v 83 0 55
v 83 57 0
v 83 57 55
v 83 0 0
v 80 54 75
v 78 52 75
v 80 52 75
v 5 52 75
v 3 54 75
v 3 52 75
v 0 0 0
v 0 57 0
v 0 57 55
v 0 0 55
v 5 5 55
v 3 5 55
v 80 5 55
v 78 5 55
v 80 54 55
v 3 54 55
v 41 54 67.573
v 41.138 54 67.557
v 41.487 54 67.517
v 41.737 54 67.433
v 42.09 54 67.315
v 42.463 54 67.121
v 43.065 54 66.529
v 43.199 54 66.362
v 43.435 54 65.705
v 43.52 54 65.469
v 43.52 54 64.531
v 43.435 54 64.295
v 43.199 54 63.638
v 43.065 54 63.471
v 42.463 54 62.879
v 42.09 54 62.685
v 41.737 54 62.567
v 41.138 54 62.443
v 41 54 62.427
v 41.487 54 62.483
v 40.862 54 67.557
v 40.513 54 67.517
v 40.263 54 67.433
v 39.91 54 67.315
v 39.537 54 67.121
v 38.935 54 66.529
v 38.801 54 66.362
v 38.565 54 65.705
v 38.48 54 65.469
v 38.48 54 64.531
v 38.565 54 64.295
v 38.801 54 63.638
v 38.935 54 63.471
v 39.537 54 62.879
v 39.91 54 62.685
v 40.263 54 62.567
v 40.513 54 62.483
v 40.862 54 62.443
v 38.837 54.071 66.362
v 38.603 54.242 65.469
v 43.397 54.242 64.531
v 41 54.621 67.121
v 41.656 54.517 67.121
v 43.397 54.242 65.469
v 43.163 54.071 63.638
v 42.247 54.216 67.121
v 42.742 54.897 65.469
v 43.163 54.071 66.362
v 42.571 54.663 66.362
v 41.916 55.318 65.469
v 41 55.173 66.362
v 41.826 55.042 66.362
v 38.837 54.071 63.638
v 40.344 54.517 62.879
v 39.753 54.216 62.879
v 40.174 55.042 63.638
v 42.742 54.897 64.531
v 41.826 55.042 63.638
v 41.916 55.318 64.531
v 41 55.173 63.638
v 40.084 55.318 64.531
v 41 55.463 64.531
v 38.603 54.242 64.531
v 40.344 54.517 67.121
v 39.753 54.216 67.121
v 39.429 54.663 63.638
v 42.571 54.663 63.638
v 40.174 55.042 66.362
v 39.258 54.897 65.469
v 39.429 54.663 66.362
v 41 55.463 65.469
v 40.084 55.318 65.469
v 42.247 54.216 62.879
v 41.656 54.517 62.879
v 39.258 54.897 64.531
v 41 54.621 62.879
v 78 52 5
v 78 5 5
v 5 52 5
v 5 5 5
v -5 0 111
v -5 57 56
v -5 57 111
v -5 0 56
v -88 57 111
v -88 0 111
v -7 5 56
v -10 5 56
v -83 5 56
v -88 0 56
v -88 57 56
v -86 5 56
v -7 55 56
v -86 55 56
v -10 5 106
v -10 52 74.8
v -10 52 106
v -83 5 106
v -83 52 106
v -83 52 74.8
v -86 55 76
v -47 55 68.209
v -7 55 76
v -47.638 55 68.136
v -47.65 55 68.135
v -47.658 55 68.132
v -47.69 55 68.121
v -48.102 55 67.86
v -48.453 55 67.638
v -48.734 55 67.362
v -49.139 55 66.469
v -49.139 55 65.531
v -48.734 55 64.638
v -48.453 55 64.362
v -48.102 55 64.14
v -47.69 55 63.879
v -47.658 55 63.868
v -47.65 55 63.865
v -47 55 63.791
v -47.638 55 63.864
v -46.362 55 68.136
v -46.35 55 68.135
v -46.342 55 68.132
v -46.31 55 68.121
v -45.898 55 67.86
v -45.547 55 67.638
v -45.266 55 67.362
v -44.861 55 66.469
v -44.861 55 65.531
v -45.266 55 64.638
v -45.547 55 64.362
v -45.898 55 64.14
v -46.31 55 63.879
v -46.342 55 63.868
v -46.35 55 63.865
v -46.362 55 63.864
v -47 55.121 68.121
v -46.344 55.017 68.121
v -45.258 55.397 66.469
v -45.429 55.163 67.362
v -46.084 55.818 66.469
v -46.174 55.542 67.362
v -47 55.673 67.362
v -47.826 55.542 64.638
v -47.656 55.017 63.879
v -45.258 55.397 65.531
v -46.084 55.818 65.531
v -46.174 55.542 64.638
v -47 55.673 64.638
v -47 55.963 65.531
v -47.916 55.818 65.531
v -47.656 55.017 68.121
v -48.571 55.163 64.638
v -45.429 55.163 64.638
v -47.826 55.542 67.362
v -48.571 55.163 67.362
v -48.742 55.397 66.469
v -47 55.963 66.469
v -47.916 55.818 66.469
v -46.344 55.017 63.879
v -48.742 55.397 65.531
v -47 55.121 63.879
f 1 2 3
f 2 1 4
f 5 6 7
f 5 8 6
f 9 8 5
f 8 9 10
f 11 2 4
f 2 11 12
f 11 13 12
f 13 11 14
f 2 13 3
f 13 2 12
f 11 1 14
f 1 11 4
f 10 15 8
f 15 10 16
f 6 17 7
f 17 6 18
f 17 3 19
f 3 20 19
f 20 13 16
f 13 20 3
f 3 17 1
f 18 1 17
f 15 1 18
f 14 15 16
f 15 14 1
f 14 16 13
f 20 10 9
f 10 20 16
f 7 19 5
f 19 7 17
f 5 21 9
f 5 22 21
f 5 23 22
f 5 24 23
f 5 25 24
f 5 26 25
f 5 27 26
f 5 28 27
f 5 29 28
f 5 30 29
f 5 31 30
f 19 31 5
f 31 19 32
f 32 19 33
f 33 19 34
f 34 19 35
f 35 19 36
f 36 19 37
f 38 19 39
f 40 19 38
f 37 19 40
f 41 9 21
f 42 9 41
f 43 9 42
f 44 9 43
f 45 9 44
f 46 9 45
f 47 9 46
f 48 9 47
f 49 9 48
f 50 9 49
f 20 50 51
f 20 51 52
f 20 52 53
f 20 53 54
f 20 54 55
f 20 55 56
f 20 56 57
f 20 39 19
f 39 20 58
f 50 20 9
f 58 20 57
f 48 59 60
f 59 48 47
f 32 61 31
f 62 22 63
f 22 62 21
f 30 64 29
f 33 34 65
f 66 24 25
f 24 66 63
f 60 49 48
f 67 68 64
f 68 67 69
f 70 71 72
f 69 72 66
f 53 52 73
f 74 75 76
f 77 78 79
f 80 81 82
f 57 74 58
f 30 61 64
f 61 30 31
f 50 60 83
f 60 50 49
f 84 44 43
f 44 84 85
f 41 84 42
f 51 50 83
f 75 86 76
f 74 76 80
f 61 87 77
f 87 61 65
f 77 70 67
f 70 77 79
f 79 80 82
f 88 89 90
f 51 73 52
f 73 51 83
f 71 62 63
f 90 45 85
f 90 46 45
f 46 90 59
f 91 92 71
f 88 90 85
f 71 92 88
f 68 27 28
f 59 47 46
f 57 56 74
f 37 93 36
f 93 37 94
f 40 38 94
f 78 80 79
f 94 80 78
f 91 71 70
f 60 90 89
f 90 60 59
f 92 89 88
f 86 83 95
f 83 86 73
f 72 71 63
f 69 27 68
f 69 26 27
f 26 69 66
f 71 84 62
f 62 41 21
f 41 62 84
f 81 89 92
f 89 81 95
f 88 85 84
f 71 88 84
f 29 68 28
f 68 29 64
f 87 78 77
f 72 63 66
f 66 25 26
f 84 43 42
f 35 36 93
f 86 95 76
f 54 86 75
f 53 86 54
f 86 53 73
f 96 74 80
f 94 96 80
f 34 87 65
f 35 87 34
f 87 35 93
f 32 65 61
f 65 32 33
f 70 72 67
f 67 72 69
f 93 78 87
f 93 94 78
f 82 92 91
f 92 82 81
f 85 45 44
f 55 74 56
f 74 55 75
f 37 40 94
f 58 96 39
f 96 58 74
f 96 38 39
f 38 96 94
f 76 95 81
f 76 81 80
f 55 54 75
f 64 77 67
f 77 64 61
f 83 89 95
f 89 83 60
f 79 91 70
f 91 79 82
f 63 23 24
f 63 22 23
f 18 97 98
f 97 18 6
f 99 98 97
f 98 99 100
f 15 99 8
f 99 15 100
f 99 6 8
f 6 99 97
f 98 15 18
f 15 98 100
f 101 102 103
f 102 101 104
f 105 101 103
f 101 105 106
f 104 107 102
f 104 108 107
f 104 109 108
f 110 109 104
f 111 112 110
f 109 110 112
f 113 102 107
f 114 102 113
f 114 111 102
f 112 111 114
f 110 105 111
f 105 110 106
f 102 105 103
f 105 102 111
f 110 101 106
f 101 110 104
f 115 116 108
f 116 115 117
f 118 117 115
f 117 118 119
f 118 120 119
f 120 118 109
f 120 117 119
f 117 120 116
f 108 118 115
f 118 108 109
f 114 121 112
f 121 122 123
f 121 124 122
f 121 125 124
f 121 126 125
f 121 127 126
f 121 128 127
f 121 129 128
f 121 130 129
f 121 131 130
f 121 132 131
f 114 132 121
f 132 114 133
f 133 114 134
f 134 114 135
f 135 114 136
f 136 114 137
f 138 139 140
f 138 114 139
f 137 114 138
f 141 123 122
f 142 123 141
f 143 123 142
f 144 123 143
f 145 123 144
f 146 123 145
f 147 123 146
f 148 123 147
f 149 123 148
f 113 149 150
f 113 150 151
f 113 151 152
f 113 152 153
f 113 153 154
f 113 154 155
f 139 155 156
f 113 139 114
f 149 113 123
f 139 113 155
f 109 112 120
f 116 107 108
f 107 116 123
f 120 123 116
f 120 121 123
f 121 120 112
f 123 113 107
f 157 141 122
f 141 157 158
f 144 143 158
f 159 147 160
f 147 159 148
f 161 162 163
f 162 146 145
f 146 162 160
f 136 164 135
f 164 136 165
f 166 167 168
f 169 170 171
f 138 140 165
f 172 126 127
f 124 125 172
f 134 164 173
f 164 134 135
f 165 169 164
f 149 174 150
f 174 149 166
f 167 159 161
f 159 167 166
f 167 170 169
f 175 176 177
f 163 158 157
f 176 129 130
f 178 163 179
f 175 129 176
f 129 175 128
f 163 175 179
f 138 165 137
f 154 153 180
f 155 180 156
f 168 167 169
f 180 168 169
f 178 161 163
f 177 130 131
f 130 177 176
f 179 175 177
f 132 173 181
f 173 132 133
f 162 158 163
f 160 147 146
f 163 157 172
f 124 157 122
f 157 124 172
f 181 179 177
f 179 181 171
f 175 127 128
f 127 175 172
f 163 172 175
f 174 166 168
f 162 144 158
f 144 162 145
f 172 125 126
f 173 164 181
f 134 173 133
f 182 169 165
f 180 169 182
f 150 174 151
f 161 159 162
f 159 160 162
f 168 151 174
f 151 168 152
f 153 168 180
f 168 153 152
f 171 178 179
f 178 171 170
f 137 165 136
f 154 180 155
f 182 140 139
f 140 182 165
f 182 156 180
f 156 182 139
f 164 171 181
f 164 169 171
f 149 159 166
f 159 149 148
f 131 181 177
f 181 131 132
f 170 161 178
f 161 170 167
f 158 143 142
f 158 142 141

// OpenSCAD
union() {
	difference() {
		union() {
			difference() {
				difference() {
					difference() {
						difference() {
							cube(size = [83, 57, 75]);
							translate(v = [-1, 0, 55]) {
								rotate(a = 90, v = [0, 0, 1]) {
									rotate(a = 90, v = [1, 0, 0]) {
										linear_extrude(height = 85) {
											polygon(paths = [[0, 1, 2, 3, 4]], points = [[-1, 0], [5, 0], [52, 20], [52, 100], [-1, 100]]);
										}
									}
								}
							}
						}
						translate(v = [-1, -1, 55]) {
							cube(size = [4, 472, 100]);
						}
					}
					translate(v = [80, -1, 55]) {
						cube(size = [4, 472, 100]);
					}
				}
				translate(v = [-1, 54, 55]) {
					cube(size = [85, 4, 100]);
				}
			}
			translate(v = [41, 52.5000000000, 65.0000000000]) {
				sphere($fn = 20, r = 3);
			}
		}
		translate(v = [5, 5, 5]) {
			cube(size = [73, 47, 100]);
		}
	}
	translate(v = [-88, 0, 1]) {
		difference() {
			difference() {
				difference() {
					translate(v = [0, 0, 55]) {
						cube(size = [83, 57, 55]);
					}
					translate(v = [5, 5, 5]) {
						cube(size = [73, 47, 100]);
					}
				}
				translate(v = [2, 0, 55]) {
					rotate(a = 90, v = [0, 0, 1]) {
						rotate(a = 90, v = [1, 0, 0]) {
							linear_extrude(height = 79) {
								polygon(paths = [[0, 1, 2, 3]], points = [[5, -2], [55, -2], [55, 20], [5, 0]]);
							}
						}
					}
				}
			}
			translate(v = [41, 53.0000000000, 65.0000000000]) {
				sphere($fn = 20, r = 3);
			}
		}
	}
}
